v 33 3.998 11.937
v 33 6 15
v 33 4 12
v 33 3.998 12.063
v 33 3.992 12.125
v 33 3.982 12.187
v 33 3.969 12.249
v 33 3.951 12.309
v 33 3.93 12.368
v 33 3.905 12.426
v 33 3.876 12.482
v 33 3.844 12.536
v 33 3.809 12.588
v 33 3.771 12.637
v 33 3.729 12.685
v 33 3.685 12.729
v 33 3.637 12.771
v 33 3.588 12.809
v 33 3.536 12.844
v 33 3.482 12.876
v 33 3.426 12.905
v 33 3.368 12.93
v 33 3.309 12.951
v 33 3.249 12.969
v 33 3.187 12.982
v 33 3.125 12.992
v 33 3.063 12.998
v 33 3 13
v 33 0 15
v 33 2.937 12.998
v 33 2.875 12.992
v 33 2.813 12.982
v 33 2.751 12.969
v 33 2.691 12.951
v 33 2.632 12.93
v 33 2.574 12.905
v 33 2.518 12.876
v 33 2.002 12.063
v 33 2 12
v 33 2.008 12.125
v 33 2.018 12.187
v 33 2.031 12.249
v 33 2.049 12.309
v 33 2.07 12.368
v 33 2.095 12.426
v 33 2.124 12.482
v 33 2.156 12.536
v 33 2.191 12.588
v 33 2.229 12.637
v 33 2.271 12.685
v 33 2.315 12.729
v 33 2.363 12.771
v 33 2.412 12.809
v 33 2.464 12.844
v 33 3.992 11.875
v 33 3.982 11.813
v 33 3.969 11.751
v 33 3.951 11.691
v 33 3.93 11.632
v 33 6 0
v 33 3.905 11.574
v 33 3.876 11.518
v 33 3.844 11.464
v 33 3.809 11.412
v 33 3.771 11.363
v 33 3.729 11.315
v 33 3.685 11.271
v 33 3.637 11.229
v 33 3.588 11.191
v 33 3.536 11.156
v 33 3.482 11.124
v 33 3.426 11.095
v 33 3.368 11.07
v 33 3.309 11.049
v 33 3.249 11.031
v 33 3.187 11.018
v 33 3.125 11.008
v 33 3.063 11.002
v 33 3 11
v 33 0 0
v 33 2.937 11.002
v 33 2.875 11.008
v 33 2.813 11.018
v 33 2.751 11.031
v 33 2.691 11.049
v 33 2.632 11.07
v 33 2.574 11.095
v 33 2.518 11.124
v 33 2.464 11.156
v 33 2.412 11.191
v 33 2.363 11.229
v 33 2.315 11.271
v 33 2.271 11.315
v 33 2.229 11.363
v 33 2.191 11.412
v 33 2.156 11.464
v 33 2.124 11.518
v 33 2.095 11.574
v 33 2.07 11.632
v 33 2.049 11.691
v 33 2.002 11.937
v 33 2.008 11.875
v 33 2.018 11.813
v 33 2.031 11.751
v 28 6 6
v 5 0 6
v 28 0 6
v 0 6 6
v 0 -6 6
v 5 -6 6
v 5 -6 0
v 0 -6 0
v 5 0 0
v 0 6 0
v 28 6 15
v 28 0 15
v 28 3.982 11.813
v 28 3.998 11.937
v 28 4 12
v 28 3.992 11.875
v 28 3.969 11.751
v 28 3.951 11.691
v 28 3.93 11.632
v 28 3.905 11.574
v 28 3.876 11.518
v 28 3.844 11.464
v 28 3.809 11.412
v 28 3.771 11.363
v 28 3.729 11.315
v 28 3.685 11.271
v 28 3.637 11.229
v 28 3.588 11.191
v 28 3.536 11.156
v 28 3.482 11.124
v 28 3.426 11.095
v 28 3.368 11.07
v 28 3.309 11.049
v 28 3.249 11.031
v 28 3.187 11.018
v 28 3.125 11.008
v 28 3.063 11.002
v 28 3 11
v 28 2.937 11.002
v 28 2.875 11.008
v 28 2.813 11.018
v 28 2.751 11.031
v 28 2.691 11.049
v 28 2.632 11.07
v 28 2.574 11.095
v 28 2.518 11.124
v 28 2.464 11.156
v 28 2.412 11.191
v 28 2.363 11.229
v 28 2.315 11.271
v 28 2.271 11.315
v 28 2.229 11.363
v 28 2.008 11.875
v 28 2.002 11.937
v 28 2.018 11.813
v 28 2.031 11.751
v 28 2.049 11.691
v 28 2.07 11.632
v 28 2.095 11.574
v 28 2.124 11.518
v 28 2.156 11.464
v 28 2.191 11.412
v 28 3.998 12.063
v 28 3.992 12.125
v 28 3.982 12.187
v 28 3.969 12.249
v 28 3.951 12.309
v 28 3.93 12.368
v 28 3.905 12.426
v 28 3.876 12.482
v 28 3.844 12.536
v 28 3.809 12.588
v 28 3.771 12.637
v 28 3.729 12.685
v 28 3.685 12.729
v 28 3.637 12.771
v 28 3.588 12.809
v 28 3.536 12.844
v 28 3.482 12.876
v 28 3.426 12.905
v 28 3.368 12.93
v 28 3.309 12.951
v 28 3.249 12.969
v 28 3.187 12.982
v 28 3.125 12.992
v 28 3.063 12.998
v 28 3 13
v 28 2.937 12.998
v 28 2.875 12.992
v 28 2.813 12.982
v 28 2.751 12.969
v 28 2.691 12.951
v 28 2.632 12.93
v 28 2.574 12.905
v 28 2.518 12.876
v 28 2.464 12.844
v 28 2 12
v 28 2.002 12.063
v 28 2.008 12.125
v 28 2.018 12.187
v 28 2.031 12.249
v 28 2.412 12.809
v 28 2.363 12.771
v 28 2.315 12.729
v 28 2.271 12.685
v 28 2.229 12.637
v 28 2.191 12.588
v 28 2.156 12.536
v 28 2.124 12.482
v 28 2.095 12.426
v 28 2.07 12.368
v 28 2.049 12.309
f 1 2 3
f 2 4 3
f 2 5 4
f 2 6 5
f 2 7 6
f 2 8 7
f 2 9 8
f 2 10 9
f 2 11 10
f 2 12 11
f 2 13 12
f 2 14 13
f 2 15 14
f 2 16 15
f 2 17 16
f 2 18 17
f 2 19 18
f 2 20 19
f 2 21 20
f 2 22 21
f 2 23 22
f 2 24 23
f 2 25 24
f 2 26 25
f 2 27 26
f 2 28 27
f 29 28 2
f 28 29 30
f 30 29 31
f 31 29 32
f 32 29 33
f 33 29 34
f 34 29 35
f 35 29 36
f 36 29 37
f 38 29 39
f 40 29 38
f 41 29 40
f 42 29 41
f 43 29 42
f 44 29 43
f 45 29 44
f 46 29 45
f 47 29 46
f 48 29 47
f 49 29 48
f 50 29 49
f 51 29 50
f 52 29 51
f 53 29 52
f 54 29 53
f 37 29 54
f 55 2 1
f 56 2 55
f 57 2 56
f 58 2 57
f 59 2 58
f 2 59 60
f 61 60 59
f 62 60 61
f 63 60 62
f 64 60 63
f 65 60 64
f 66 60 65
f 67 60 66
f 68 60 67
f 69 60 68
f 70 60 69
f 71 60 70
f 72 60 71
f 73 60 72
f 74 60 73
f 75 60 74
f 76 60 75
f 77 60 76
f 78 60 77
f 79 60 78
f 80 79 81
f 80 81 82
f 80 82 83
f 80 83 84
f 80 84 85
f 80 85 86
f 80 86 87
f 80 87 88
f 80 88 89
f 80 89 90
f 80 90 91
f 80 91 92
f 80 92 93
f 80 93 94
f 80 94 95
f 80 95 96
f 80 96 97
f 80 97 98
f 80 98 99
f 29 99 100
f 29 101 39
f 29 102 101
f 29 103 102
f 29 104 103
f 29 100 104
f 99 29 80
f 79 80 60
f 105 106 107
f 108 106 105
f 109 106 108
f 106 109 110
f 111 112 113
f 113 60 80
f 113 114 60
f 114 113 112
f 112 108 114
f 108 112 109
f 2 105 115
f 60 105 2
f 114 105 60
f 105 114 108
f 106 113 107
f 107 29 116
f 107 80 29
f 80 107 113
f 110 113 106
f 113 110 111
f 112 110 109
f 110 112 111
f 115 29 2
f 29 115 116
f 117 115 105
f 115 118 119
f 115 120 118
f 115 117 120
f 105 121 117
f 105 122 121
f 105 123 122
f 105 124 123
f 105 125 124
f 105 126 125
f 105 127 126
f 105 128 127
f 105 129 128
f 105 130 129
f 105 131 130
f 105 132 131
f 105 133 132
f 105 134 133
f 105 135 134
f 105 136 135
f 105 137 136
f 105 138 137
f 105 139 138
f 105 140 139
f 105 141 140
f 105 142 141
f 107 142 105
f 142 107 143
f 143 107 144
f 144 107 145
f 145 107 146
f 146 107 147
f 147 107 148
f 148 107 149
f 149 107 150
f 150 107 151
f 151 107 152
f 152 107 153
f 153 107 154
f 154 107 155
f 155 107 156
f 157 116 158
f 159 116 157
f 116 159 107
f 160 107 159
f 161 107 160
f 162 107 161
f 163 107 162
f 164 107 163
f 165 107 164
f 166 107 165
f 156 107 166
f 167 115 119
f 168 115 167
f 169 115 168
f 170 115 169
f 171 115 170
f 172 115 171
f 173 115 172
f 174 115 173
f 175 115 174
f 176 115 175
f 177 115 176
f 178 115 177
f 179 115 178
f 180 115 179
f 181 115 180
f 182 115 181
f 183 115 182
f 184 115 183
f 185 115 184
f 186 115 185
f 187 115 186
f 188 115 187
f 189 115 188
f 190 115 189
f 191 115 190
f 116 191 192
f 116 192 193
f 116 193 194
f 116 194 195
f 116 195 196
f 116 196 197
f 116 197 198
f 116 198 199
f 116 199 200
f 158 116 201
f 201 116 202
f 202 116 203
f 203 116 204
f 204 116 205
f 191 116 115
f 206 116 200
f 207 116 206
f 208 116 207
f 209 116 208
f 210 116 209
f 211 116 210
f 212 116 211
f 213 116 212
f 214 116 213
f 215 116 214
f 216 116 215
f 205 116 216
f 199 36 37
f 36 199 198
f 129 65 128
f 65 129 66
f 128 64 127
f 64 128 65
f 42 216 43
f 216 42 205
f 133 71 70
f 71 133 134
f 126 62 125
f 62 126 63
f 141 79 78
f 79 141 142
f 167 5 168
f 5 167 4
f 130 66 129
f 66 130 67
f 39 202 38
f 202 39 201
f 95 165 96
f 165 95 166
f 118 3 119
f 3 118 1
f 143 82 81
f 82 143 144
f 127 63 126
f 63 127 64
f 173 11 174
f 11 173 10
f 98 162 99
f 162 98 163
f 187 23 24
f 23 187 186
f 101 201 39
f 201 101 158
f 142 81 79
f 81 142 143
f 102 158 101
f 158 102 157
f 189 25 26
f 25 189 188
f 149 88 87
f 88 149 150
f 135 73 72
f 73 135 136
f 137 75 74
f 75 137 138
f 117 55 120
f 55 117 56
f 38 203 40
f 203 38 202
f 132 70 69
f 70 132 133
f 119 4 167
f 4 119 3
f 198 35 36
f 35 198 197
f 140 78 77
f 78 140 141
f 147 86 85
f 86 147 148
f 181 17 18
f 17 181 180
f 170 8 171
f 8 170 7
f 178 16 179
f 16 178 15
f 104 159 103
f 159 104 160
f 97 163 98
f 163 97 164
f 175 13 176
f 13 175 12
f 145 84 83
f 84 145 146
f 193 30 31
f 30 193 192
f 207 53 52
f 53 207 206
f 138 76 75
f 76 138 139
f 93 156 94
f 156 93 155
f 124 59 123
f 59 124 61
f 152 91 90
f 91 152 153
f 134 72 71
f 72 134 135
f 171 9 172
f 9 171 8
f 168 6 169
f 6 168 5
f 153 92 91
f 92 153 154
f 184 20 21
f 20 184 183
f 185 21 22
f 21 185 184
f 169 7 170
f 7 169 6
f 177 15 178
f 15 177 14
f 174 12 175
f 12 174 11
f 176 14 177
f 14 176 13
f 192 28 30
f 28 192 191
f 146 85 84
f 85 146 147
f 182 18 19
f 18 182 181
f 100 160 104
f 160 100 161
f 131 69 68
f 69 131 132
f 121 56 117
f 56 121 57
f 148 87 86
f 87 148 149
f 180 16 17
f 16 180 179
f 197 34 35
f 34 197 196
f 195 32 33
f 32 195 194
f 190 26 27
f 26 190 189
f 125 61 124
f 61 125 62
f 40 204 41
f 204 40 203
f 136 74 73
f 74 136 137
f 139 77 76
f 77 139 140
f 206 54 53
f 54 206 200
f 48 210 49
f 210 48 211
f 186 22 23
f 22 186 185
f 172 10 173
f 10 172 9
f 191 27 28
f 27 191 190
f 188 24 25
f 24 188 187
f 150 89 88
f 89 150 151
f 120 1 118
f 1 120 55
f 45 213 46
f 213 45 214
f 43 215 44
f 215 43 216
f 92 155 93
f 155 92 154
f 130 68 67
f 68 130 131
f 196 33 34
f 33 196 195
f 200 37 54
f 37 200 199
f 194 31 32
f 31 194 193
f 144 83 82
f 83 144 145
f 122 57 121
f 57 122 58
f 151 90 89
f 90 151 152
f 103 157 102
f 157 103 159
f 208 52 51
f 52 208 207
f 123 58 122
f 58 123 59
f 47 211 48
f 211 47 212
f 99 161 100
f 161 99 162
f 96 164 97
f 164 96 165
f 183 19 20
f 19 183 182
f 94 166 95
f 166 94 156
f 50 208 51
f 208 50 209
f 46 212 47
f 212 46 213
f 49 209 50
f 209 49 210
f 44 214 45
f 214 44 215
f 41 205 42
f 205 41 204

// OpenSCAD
$fn = 100;

module perno(){
    cube([33,6,6]);

translate([0,-6,0]){
    cube([5,6,6]);
}

translate([28,0,0]){
    cube([5,6,15]);
    };
}
difference(){
    perno();
    translate([25,3,12]){
        rotate([0,90,0]){
        cylinder(10,1,1);
        }
    }
}
